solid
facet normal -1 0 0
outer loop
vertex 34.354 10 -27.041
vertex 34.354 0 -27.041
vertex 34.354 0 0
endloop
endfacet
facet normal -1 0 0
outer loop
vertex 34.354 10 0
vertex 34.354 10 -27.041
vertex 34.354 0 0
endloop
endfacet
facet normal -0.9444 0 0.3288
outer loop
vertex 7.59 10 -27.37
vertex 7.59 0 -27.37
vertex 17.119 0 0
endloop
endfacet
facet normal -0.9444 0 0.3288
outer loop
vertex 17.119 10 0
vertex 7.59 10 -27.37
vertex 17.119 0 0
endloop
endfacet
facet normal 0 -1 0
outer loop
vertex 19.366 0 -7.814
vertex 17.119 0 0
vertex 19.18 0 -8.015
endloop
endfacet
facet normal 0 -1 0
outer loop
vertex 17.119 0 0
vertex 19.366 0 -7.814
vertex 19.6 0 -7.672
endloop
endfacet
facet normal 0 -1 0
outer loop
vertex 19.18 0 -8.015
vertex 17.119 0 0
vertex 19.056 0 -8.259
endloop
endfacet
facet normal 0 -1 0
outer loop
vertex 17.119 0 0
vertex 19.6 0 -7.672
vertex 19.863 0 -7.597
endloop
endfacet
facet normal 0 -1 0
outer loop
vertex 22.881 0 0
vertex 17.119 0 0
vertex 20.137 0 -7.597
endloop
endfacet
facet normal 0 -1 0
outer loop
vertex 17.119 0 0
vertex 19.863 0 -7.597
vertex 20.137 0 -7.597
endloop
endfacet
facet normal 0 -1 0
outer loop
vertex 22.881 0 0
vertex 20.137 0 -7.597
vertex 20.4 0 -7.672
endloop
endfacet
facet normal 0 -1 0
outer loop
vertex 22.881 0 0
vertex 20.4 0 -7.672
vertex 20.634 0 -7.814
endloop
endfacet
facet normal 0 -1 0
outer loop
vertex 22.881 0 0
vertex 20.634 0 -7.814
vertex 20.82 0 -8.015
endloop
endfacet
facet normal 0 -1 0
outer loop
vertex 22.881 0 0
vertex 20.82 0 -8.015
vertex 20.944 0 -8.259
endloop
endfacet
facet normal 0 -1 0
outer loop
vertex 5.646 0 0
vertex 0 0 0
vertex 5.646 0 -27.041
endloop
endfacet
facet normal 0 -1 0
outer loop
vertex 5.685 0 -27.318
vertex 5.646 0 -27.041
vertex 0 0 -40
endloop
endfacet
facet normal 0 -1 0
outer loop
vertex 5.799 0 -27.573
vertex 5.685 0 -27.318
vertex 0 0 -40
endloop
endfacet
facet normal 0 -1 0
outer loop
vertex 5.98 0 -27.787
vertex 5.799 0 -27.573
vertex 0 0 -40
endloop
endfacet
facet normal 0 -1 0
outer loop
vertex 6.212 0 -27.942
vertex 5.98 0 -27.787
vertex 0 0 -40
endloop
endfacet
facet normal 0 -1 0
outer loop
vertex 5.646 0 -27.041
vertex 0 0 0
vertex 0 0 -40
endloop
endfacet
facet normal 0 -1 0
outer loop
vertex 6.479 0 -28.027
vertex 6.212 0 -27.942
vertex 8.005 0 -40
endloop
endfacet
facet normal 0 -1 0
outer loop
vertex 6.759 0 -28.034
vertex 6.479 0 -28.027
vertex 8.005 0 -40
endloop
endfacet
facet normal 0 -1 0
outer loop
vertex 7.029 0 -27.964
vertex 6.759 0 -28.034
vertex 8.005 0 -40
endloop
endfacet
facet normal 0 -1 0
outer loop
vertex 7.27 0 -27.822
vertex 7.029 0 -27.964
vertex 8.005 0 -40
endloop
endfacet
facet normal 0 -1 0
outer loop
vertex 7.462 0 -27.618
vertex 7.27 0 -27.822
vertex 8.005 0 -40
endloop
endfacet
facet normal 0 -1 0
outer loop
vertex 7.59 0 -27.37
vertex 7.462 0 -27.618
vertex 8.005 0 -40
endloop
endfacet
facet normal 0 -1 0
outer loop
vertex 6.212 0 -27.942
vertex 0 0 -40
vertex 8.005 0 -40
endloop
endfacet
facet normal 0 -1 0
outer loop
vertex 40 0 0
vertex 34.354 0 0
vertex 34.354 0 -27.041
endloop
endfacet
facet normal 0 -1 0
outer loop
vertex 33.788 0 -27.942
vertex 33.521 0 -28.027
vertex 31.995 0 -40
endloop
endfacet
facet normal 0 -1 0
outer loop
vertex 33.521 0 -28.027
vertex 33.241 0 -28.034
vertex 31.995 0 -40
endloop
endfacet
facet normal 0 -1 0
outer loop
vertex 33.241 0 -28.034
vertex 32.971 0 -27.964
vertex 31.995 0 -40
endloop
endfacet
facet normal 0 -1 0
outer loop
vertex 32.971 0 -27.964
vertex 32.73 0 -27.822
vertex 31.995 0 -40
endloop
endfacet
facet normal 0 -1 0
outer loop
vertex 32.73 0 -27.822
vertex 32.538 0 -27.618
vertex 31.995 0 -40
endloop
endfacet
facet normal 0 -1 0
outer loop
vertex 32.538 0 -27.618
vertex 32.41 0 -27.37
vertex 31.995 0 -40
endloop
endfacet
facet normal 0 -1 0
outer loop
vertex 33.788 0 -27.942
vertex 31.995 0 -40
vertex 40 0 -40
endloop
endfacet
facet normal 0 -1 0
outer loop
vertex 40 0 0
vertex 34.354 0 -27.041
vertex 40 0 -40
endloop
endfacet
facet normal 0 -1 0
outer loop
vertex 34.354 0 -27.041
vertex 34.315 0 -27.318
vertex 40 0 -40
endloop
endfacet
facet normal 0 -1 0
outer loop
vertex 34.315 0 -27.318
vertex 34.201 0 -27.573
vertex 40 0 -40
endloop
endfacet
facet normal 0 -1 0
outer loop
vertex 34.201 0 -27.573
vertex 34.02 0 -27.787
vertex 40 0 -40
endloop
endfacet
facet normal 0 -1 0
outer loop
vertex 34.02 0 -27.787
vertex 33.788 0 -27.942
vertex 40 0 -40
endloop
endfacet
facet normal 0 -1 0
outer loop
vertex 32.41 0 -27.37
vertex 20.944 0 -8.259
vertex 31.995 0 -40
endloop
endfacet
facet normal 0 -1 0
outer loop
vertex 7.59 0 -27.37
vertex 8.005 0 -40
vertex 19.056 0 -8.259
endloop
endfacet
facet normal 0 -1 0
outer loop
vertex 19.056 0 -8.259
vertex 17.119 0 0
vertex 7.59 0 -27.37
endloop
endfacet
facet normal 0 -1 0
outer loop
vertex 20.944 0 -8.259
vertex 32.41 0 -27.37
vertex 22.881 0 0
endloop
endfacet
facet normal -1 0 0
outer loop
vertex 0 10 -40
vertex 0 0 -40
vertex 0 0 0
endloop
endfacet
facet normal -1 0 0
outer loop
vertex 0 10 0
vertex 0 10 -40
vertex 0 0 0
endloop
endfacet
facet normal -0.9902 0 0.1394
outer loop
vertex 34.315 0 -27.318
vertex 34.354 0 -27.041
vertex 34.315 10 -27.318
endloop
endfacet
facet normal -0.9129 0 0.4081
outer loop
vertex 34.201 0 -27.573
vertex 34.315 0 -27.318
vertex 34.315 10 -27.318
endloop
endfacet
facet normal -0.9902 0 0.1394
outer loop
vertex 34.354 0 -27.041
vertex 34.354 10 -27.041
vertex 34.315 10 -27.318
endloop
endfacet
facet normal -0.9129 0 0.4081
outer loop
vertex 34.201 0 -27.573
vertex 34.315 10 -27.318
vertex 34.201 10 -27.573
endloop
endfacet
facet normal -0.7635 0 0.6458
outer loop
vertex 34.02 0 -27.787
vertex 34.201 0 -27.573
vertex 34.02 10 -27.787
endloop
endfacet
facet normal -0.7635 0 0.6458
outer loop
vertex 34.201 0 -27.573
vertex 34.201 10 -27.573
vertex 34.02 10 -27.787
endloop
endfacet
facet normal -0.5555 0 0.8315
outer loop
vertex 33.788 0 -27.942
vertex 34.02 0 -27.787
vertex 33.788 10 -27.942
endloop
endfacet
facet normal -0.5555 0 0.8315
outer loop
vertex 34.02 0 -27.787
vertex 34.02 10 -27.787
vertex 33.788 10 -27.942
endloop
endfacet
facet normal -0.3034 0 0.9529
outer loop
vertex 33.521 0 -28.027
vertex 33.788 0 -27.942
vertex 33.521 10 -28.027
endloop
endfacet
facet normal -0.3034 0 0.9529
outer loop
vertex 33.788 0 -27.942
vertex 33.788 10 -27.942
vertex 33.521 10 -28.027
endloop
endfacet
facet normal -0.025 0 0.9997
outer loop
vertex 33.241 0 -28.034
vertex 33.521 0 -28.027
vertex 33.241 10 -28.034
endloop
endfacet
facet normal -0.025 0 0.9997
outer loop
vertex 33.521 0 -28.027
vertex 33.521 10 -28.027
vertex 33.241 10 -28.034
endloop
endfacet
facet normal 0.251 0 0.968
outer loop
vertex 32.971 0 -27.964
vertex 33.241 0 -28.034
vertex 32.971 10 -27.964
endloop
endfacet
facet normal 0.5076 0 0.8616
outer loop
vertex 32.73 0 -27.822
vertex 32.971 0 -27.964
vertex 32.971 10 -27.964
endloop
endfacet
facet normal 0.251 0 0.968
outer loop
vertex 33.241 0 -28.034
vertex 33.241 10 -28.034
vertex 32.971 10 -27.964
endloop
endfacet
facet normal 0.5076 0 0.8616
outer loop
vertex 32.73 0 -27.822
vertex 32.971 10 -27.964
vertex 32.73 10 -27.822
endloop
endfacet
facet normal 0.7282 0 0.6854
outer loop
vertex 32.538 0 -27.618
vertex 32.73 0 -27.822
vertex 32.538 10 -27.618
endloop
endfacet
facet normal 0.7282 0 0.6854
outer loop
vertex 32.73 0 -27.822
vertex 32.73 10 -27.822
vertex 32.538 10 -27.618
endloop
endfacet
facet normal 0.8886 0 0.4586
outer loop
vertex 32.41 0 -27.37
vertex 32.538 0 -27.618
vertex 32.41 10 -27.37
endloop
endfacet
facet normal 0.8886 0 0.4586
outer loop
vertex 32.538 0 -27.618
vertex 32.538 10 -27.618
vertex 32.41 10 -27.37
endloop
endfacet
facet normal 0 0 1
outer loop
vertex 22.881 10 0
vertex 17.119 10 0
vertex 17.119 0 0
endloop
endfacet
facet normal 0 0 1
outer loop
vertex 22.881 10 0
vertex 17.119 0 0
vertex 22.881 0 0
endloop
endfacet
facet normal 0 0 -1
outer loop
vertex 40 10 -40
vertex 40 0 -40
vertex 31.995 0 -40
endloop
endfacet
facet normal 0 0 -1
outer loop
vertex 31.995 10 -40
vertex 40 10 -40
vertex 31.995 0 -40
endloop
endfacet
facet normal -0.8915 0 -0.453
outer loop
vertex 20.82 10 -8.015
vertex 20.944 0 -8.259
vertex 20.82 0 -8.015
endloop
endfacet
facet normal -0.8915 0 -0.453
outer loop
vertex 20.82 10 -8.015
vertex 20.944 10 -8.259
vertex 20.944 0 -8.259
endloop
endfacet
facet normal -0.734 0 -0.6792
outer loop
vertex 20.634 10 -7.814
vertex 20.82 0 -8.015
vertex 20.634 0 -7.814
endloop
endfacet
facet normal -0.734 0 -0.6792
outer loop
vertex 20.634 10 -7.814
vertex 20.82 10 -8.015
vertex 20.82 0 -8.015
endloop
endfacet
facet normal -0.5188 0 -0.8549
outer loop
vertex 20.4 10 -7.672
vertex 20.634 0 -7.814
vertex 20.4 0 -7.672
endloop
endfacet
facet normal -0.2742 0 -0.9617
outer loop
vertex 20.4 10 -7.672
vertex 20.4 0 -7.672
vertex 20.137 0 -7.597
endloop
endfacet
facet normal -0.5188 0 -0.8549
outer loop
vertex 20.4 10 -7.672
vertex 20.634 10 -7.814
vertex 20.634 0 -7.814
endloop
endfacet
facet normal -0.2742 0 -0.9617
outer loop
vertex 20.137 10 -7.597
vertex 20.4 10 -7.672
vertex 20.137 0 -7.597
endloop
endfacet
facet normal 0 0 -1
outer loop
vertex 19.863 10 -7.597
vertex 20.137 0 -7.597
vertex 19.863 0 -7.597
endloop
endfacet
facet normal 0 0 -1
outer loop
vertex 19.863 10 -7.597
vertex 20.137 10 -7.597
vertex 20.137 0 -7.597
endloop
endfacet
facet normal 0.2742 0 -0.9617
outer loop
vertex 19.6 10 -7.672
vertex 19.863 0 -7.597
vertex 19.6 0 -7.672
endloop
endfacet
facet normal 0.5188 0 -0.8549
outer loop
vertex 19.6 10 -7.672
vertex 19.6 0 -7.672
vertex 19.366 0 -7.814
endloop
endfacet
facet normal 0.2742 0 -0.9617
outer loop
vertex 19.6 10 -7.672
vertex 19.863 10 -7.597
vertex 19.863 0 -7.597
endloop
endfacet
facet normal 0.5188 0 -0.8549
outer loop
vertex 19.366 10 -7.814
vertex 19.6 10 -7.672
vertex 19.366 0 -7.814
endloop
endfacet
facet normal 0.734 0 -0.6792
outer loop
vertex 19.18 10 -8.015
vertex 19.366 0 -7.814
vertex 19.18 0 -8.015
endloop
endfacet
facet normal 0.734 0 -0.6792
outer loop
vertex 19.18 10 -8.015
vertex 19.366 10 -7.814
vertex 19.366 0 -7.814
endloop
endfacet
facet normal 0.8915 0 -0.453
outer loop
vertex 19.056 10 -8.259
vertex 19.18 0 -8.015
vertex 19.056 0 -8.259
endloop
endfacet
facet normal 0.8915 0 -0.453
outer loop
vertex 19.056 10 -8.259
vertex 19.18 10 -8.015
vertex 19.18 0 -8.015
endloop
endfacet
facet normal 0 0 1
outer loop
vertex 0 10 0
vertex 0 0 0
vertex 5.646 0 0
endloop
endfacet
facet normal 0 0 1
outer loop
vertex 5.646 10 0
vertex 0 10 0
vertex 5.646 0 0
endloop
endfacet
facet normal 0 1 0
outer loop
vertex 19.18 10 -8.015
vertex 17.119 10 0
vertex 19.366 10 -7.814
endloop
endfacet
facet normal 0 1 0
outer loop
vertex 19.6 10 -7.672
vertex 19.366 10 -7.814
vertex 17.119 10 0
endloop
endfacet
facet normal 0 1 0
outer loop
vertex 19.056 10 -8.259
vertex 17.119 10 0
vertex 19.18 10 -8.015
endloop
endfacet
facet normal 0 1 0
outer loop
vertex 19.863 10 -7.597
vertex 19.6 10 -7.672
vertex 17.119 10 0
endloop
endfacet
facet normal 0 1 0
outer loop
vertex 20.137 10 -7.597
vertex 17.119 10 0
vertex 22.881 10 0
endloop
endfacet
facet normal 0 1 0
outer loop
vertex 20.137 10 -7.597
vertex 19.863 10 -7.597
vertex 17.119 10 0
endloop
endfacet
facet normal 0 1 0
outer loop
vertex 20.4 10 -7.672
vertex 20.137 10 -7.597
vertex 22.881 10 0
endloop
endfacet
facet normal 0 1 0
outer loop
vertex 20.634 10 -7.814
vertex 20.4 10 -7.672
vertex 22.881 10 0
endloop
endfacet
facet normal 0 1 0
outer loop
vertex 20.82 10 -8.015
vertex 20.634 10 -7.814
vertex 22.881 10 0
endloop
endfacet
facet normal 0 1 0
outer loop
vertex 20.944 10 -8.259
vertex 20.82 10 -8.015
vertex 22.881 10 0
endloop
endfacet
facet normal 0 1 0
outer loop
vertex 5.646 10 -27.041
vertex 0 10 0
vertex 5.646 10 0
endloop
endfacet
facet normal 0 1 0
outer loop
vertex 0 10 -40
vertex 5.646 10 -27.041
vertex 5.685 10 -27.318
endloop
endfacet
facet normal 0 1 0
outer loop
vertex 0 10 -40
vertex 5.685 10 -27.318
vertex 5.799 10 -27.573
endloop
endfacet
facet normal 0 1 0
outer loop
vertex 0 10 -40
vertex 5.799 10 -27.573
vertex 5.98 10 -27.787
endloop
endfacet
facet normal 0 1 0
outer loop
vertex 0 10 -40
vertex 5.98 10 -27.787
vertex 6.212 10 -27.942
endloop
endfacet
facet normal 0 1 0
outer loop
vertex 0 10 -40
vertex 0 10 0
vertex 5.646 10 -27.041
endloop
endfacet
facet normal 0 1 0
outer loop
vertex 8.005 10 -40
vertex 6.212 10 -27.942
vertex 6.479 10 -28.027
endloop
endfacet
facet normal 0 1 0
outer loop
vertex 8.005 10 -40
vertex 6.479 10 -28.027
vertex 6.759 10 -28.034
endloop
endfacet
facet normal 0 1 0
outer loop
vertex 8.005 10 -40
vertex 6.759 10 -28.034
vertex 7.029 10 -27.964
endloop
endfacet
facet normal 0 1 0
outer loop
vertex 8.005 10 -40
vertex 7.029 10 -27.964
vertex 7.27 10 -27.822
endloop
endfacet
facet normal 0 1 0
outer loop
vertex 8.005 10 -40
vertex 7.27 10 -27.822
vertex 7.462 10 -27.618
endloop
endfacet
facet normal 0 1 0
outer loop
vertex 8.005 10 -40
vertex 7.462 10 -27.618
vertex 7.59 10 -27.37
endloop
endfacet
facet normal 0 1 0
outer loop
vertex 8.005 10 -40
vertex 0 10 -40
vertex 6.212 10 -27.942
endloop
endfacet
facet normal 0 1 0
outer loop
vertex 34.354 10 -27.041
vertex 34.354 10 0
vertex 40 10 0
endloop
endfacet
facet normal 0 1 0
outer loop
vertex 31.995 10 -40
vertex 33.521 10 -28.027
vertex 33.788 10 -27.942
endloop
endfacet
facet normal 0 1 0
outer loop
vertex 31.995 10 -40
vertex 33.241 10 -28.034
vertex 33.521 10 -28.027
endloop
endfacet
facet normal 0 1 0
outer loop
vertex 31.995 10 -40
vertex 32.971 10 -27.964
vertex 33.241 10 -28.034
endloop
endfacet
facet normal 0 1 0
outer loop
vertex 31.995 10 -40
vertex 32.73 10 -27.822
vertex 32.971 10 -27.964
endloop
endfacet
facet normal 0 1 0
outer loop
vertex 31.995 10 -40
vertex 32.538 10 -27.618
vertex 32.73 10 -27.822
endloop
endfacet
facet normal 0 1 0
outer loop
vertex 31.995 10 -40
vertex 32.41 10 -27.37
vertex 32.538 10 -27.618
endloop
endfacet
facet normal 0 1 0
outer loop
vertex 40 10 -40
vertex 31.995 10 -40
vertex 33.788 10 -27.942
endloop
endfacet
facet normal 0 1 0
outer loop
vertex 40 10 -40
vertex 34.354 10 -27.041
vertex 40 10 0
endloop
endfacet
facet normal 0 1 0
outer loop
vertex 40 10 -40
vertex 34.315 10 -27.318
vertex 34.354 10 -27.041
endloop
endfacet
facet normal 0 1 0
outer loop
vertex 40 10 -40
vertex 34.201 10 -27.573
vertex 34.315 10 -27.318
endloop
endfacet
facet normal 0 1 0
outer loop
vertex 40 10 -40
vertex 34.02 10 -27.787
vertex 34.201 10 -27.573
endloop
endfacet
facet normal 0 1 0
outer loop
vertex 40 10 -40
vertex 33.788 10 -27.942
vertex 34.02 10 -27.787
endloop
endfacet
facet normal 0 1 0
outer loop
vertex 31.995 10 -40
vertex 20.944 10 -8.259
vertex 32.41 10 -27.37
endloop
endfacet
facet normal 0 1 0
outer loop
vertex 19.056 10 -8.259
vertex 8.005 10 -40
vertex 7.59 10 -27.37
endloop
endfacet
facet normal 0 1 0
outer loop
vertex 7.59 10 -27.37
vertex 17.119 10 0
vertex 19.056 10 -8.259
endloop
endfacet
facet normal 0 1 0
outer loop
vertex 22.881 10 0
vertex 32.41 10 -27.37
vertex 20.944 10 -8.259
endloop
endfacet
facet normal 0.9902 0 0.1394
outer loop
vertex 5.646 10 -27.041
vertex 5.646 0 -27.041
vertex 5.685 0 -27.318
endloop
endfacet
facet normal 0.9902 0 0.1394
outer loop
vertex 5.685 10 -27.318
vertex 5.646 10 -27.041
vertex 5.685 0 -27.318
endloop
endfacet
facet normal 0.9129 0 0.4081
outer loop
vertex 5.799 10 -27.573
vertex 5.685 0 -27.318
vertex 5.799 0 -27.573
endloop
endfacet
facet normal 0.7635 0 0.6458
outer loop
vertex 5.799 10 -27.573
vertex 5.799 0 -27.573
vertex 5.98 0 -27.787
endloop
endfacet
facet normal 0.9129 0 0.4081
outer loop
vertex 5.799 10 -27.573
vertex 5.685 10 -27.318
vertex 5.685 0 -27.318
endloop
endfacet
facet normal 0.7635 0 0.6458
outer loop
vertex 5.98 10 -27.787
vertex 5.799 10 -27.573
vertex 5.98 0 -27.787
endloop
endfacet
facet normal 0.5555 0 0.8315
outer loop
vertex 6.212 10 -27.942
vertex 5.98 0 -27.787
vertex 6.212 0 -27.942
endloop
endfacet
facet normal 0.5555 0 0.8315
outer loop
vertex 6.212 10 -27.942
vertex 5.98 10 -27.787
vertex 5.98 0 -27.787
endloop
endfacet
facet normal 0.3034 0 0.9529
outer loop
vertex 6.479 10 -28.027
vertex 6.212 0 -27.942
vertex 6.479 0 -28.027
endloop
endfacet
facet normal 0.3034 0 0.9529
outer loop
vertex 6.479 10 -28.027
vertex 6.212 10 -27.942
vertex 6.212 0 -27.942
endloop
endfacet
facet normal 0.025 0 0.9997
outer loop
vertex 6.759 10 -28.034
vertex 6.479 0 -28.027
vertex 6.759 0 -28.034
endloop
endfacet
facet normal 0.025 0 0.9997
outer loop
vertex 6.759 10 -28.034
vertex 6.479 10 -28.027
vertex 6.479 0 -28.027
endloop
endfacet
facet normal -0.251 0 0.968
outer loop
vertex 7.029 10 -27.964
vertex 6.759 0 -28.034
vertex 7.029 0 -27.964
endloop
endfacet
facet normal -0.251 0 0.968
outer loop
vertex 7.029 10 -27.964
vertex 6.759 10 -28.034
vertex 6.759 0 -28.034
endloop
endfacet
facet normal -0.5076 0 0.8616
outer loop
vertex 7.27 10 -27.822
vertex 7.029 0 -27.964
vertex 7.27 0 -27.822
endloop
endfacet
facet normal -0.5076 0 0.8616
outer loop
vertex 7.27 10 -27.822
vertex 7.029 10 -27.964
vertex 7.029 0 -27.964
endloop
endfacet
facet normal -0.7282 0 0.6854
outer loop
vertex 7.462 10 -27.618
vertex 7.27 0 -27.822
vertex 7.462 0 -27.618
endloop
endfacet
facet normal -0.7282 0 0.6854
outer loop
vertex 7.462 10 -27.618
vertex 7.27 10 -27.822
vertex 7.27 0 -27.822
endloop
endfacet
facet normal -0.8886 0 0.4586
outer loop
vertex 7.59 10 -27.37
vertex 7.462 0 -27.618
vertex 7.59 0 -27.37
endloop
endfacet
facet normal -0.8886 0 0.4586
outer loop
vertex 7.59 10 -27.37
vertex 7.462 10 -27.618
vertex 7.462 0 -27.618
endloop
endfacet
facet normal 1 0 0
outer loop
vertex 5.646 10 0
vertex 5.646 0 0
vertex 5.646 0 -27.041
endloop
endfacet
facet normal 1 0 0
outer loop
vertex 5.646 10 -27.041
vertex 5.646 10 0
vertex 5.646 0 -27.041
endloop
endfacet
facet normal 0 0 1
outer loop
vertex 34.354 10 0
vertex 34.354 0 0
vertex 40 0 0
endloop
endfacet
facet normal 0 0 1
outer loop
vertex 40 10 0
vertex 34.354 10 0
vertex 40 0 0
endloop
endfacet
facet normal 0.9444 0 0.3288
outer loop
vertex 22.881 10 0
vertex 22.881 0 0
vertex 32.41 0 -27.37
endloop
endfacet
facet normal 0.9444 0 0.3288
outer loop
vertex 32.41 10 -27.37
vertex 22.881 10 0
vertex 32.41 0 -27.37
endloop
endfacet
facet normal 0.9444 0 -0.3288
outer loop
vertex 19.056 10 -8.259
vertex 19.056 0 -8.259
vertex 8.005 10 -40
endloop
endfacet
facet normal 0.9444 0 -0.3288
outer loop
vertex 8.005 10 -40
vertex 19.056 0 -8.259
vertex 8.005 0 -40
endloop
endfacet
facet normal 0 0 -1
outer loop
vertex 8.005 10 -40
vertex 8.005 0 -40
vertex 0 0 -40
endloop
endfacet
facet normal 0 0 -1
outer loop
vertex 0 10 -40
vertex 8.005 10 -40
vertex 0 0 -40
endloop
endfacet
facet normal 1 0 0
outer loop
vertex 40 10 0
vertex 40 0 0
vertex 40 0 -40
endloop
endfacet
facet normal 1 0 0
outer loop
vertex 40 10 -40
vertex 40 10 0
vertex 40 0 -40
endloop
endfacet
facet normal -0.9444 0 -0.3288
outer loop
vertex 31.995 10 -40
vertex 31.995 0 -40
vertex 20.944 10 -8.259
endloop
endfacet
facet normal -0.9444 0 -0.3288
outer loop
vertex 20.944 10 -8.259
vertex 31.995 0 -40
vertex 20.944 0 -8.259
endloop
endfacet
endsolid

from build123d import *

# Parameters (mm, degrees)
BOSS_EXTRUDE1_DEPTH = 10
FILLET1_R           = 1


with BuildPart() as part:
    # Sketch1 → Boss-Extrude1 (new body)
    with BuildSketch(Plane(origin=(0, 0, 0), x_dir=(1, 0, 0), z_dir=(0, 1, 0))):
        Polygon((34.354251199, 32.954418358), (34.354251199, 0), (40, 0), (40, 40), (31.995376073, 40), (20, 5.546535934), (8.004623927, 40), (0, 40), (0, 0), (5.645748801, 0), (5.645748801, 32.954418358), (17.119214595, 0), (22.880785405, 0), align=None)
    extrude(amount=BOSS_EXTRUDE1_DEPTH)

    # Fillet1
    fillet1_edges = [part.edges().sort_by_distance(p)[0] for p in [
        (34.354251199, 5, -32.954418358),
        (5.645748801, 5, -32.954418358),
        (20, 5, -5.546535934),
    ]]
    fillet(fillet1_edges, radius=FILLET1_R)


solid = part.part
